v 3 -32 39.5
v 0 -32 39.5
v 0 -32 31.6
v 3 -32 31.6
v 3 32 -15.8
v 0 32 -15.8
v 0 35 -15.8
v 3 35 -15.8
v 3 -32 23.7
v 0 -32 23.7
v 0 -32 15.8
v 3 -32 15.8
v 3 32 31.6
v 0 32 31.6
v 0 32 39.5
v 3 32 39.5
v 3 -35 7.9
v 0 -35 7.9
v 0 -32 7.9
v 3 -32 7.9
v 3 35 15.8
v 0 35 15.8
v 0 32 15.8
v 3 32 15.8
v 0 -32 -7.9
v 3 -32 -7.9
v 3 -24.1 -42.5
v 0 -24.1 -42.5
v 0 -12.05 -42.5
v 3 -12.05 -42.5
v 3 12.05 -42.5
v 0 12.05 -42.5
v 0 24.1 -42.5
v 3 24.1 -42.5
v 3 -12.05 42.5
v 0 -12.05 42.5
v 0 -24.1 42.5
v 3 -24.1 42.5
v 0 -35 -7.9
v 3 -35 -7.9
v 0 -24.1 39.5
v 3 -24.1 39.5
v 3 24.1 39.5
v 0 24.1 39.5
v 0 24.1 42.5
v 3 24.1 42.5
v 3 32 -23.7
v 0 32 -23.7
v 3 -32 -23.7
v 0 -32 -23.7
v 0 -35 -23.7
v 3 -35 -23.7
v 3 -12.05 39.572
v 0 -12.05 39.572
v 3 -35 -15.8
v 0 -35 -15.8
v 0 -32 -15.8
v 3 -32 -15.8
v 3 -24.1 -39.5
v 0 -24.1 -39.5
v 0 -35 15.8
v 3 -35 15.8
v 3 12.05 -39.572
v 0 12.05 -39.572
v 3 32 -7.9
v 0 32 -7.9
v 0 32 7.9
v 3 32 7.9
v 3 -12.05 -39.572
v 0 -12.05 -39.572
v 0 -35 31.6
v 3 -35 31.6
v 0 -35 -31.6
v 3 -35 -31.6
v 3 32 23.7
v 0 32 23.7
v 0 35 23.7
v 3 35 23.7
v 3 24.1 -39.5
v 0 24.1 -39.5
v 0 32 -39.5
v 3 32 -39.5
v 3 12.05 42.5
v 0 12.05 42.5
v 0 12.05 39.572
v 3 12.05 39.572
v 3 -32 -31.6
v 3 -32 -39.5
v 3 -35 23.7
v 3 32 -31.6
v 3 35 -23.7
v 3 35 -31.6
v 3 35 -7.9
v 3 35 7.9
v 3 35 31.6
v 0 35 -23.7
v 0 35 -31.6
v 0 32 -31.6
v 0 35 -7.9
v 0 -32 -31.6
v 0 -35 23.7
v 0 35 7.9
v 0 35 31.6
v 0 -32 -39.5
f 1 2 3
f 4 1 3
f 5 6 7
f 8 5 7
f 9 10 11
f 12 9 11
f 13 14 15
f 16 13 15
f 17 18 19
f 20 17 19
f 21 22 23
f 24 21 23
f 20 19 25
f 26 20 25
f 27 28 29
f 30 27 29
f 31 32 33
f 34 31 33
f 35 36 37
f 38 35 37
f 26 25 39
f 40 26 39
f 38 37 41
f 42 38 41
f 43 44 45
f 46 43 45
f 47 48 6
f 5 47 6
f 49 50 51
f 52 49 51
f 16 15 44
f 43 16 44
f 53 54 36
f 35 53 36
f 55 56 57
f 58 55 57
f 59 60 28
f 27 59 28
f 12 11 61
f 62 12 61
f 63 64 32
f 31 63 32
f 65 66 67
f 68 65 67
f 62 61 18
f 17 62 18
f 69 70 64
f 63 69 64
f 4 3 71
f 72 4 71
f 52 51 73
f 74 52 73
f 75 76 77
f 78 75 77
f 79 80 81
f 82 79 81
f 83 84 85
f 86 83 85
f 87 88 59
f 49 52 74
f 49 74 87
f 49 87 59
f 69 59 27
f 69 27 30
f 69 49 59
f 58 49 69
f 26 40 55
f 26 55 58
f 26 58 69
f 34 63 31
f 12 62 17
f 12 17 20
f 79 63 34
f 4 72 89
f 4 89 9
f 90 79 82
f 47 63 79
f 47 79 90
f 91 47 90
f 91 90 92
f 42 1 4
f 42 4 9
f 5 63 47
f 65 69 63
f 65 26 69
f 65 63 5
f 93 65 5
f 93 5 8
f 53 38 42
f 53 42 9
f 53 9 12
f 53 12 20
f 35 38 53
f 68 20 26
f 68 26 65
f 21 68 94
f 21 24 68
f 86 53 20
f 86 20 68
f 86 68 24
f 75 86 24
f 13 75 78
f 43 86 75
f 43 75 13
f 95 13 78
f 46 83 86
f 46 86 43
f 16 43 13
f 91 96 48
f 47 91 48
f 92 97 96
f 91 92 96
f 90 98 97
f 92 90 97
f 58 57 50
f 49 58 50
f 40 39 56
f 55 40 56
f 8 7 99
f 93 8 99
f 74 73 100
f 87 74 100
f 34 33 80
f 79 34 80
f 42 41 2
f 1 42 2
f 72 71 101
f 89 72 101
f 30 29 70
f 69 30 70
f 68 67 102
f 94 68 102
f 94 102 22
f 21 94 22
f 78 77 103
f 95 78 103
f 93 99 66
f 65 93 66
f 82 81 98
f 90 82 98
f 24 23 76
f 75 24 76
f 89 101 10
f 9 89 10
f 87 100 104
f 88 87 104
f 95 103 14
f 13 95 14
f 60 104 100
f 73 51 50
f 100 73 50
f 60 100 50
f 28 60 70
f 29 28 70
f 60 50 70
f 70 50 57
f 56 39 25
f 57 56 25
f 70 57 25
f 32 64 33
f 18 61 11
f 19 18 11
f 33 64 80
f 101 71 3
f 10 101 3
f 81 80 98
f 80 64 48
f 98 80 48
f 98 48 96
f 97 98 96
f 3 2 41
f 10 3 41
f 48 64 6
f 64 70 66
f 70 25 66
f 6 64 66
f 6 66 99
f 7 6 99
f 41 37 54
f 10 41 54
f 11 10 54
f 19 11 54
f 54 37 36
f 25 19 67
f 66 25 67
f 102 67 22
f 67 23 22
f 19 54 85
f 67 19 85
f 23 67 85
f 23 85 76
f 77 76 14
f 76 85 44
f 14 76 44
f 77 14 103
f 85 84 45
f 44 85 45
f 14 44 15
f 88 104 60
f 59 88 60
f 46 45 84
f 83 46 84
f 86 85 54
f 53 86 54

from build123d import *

# Parameters (mm, degrees)
F1_DEPTH = 3


with BuildPart() as f1:
    # F0 (on Right) → F1 (new body)
    with BuildSketch(Plane.YZ):
        Polygon((-12.05, 42.5), (-24.1, 42.5), (-24.1, 39.5), (-32, 39.5), (-32, 31.6), (-35, 31.6), (-35, 23.7), (-32, 23.7), (-32, 15.8), (-35, 15.8), (-35, 7.9), (-32, 7.9), (-32, 0), (-32, -7.9), (-35, -7.9), (-35, -15.8), (-32, -15.8), (-32, -23.7), (-35, -23.7), (-35, -31.6), (-32, -31.6), (-32, -39.5), (-24.1, -39.5), (-24.1, -42.5), (-12.05, -42.5), (-12.05, -39.572205), (12.05, -39.572205), (12.05, -42.5), (24.1, -42.5), (24.1, -39.5), (32, -39.5), (32, -31.6), (35, -31.6), (35, -23.7), (32, -23.7), (32, -15.8), (35, -15.8), (35, -7.9), (32, -7.9), (32, 0), (32, 7.9), (35, 7.9), (35, 15.8), (32, 15.8), (32, 23.7), (35, 23.7), (35, 31.6), (32, 31.6), (32, 39.5), (24.1, 39.5), (24.1, 42.5), (12.05, 42.5), (12.05, 39.572205), (-12.05, 39.572205), align=None)
    extrude(amount=F1_DEPTH)


solid = f1.part
